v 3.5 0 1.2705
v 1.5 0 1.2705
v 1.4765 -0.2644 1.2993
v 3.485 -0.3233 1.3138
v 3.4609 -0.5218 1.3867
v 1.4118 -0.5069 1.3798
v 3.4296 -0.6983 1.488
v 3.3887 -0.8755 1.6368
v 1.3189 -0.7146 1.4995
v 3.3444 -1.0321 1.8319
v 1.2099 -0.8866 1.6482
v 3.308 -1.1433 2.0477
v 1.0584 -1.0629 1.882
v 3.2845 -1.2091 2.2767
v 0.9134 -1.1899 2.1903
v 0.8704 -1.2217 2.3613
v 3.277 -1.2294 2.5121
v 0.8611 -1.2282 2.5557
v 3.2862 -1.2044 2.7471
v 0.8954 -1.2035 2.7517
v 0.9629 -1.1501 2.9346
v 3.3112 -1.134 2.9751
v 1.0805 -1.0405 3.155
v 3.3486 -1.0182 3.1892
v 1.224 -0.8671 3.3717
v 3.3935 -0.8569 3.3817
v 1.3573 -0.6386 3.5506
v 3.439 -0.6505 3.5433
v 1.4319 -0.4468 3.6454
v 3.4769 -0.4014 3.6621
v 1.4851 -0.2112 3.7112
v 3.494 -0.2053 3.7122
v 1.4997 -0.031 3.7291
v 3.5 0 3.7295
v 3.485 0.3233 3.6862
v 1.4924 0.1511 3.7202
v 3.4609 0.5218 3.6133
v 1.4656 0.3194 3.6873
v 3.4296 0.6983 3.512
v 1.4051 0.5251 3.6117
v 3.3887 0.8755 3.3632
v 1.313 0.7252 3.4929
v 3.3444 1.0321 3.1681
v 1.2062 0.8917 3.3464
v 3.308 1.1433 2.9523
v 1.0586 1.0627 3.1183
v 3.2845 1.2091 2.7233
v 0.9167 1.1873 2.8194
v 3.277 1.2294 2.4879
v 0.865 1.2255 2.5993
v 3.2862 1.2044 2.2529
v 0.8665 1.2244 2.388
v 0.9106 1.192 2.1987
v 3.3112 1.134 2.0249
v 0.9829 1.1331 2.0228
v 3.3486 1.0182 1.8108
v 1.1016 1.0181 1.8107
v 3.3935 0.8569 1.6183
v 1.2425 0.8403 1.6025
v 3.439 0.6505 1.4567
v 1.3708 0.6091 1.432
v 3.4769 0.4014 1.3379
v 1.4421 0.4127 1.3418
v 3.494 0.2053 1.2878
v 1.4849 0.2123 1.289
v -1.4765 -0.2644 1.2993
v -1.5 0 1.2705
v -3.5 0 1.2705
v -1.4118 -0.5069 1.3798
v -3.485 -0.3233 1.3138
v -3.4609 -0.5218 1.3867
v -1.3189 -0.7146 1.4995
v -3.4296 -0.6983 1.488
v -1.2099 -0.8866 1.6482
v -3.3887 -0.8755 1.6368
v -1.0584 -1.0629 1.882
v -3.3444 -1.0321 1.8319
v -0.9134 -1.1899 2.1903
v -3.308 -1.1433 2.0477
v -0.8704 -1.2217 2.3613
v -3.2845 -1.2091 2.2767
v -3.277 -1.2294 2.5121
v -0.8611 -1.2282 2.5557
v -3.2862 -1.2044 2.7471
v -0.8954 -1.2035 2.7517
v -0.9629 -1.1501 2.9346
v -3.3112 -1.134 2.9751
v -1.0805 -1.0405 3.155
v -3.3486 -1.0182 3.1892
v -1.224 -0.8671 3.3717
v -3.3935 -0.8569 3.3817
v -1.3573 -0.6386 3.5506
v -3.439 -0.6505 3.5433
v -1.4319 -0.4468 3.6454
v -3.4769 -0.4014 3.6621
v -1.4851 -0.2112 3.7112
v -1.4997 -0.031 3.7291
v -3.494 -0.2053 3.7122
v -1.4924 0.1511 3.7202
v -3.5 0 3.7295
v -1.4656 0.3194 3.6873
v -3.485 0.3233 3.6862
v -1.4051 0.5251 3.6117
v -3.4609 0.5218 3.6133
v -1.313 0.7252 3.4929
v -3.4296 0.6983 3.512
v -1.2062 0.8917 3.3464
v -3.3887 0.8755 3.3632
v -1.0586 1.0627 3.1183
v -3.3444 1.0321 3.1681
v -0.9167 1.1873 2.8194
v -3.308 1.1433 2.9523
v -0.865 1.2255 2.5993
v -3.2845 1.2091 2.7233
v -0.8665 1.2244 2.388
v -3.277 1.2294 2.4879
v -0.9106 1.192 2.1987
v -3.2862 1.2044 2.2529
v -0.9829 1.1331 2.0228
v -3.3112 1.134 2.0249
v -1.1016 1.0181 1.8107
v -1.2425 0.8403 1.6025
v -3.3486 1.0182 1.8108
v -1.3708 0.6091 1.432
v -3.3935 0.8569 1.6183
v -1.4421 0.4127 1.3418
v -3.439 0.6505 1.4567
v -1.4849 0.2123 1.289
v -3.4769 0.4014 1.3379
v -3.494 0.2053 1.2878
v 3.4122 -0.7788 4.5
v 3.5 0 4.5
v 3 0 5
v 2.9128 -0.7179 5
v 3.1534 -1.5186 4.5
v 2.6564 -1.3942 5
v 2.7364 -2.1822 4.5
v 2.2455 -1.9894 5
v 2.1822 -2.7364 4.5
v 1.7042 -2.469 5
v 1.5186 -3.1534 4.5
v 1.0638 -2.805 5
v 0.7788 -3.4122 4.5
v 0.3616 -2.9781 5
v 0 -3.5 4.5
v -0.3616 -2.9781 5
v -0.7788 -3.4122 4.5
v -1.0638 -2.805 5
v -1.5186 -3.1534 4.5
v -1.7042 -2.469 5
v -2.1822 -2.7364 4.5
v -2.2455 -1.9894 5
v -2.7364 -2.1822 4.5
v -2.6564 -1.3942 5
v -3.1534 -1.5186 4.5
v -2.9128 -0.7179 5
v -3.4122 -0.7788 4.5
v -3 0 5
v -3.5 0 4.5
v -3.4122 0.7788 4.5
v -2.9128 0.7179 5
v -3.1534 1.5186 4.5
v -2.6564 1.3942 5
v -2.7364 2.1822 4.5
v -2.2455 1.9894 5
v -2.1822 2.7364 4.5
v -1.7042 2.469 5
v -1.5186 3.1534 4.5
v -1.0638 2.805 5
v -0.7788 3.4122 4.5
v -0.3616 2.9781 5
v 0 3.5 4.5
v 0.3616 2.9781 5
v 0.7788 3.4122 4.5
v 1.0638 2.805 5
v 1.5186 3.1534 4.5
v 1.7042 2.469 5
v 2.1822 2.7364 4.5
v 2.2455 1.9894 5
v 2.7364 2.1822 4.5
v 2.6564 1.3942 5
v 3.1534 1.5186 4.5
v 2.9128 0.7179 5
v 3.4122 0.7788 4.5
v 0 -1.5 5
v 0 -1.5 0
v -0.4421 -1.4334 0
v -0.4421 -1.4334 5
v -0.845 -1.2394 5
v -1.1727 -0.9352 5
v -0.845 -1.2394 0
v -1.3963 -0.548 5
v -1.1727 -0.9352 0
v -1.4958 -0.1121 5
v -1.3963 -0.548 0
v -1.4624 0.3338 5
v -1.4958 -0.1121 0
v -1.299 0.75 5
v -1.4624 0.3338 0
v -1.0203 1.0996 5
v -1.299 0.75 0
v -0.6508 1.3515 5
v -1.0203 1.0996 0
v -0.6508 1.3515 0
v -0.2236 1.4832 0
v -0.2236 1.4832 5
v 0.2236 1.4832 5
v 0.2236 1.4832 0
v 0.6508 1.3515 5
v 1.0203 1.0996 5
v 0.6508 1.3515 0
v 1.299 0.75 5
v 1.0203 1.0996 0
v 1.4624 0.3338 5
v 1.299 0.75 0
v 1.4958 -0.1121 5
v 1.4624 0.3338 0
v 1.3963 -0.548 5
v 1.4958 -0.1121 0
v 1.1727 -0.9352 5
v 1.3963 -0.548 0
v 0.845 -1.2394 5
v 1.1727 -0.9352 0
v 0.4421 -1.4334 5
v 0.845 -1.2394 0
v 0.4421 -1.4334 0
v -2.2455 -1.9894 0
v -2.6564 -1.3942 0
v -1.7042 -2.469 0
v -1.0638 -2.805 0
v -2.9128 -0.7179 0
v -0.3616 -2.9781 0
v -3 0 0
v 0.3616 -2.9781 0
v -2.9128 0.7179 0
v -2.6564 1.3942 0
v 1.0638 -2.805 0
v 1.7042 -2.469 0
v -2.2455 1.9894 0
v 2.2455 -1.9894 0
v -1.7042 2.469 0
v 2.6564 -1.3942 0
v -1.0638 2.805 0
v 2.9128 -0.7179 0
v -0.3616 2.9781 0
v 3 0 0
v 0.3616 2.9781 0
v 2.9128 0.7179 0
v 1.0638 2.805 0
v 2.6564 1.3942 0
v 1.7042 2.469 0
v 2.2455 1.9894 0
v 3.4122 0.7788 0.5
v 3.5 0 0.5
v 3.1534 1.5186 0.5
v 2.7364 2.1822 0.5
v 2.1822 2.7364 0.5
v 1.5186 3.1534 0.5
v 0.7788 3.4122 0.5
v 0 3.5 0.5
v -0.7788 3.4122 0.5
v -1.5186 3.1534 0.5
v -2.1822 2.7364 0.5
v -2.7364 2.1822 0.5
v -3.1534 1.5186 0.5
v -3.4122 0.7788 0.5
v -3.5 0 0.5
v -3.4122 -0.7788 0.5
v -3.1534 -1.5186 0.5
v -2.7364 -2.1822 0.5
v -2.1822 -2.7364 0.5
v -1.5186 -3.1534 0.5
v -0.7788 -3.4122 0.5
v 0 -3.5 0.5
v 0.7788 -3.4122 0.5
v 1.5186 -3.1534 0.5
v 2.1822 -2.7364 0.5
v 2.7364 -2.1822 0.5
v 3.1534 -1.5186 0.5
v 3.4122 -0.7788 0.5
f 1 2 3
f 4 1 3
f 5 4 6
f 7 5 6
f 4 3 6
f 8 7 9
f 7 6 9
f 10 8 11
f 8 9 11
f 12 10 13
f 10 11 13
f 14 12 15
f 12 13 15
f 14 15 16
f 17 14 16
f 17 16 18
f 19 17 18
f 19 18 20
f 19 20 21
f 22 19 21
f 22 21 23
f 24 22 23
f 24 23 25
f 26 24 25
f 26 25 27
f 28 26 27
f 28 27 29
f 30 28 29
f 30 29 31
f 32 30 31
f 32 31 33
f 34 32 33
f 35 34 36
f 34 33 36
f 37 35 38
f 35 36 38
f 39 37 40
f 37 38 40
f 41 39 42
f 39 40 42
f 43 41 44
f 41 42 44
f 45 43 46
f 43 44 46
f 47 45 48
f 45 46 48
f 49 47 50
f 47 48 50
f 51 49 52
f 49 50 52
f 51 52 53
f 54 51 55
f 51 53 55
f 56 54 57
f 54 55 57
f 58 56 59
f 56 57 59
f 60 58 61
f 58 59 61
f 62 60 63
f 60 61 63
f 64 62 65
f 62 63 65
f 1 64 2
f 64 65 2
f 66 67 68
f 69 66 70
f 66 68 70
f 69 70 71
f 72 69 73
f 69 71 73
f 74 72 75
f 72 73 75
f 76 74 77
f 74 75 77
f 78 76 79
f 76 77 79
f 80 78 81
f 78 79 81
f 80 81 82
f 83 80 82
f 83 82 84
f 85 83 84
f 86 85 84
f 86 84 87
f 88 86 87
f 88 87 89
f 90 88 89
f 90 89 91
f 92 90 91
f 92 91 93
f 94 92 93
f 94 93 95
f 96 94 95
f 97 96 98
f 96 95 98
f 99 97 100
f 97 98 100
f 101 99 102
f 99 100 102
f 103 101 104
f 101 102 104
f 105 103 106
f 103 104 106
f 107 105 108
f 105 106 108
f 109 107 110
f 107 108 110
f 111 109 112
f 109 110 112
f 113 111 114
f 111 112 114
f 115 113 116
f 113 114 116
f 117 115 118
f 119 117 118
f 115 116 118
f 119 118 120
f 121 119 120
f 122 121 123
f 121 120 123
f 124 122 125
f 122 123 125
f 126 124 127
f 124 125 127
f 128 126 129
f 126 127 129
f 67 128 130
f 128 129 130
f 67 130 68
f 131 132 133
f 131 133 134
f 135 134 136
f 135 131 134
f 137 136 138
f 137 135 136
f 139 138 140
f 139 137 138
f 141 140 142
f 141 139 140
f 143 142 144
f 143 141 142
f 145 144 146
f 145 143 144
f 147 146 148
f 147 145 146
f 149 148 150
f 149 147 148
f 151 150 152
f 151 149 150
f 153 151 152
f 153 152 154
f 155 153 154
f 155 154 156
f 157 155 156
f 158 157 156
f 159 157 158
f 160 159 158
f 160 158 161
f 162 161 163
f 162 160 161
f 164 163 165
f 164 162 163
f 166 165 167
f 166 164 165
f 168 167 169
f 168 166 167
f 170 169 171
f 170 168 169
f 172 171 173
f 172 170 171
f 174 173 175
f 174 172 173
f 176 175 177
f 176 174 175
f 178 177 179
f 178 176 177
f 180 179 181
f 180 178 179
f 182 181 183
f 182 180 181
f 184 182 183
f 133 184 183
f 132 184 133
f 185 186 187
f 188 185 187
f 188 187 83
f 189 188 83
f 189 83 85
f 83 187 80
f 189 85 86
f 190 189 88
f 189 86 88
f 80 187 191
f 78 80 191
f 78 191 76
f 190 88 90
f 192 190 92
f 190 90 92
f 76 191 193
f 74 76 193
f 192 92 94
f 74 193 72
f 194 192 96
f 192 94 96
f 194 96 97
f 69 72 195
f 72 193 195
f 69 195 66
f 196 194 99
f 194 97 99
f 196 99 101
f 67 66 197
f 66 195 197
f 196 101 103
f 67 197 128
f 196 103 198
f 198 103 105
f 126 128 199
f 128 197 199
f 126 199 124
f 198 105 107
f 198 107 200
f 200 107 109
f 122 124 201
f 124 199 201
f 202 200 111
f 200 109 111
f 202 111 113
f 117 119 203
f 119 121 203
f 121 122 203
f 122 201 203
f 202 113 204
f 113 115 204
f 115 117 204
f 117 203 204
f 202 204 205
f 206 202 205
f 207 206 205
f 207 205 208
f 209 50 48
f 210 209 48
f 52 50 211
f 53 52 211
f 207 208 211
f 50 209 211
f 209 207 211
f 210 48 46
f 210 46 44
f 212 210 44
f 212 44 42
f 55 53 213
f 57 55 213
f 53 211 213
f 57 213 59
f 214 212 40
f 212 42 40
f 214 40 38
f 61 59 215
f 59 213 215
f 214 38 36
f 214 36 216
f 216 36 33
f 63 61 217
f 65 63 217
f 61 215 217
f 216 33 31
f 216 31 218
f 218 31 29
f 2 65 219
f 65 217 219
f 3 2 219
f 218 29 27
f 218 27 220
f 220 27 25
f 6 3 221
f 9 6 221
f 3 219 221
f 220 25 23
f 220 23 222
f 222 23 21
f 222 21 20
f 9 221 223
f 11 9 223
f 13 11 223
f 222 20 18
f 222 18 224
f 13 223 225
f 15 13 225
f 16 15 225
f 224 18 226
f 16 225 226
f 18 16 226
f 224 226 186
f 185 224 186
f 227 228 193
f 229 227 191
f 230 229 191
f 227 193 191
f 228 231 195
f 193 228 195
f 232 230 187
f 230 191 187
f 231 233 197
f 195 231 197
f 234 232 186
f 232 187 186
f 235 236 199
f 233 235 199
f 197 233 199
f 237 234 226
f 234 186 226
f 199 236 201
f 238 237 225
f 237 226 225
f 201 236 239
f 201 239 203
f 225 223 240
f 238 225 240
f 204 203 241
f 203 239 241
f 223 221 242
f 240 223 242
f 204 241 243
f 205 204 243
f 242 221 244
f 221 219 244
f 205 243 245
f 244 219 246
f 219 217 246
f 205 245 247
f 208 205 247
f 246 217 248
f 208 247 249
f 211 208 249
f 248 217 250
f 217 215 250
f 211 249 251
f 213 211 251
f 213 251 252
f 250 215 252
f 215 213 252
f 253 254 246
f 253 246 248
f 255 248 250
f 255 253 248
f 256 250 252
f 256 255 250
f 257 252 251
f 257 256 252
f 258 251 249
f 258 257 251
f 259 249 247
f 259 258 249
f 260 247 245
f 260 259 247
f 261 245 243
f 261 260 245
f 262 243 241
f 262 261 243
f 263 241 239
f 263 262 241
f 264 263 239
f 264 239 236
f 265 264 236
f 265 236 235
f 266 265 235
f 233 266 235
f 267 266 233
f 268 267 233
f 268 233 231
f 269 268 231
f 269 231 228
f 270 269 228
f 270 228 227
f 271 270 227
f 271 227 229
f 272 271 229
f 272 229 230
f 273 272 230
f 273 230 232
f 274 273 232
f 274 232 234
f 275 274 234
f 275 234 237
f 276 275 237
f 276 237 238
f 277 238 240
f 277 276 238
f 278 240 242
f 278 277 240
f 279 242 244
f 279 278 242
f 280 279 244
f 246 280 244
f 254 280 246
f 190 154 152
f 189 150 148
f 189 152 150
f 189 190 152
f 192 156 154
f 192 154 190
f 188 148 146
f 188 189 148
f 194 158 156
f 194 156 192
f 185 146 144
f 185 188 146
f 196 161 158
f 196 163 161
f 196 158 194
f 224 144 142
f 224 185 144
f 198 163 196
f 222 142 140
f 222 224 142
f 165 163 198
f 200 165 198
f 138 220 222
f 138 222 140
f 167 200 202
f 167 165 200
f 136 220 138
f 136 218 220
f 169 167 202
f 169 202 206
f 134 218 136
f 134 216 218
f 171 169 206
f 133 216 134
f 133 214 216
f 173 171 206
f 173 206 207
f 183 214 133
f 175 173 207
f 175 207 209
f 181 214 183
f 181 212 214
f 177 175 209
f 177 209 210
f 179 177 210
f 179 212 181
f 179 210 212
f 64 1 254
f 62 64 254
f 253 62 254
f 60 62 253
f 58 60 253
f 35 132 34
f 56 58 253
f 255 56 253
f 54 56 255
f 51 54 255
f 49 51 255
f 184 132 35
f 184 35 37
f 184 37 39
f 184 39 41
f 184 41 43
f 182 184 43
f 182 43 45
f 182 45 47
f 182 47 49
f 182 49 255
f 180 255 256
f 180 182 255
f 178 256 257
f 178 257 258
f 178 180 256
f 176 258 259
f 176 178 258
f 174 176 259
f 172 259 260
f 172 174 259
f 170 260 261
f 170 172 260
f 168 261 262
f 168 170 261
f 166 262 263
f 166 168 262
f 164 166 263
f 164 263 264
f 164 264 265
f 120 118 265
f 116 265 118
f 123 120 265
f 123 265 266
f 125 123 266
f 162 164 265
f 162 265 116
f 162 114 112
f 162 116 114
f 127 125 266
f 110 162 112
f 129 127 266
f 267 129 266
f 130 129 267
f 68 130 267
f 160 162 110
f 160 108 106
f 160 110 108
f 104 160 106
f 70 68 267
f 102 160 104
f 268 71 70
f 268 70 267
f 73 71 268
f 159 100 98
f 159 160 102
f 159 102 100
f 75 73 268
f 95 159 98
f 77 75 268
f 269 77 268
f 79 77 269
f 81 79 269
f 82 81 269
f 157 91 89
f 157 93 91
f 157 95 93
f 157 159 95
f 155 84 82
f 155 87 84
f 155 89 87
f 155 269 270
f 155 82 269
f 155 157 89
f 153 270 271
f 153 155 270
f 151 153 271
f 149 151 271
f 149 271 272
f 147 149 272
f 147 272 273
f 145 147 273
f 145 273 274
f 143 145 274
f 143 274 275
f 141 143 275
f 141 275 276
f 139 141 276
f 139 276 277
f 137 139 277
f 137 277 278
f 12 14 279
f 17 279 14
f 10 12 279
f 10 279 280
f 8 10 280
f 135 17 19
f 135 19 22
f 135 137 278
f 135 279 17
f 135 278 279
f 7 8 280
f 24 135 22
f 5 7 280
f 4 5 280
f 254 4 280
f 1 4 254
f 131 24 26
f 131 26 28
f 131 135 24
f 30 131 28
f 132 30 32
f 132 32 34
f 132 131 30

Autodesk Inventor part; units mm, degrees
ref_plane "YZ Plane" through (0, 0, 0) normal (1, 0, 0) x (0, 1, 0)
ref_plane "XZ Plane" through (0, 0, 0) normal (0, 1, 0) x (-1, 0, 0)
ref_plane "XY Plane" through (0, 0, 0) normal (0, 0, 1) x (1, 0, 0)
sketch "スケッチ1" plane through (0, 0, 0) normal (0, 0, 1) x (1, 0, 0)
  line L0 (-3.5, 3.5) -> (3.5, 3.5)
  line L1 (3.5, 3.5) -> (3.5, -3.5)
  line L2 (3.5, -3.5) -> (-3.5, -3.5)
  line L3 (-3.5, -3.5) -> (-3.5, 3.5)
  line L4 (-3.5, 3.5) -> (3.5, -3.5) construction
  line L5 (3.5, 3.5) -> (-3.5, -3.5) construction
  point P0 (0, 0)
  dimension "d0" = 7
  dimension "d2" = 7
extrude "押し出し1" add sketch "スケッチ1" along normal blind 5
sketch "スケッチ2" plane through (3.5, -3.5, 0) normal (1, 0, 0) x (0, 0, -1)
  line L0 (-5, 0) -> (-5, 7) projected
  line L1 (0, 0) -> (-5, 0) projected
  point P0 (0, 3.5)
  point P1 (-2.5, 3.5)
  dimension "d5" = 2.5
  dimension "d6" = 3.5
hole "穴1" at (3.5, 0, 2.5) direction (-1, 0, 0) diameter 2.459 end through all thread size "M3x0.5" class "6H" standard "ANSI Metric M Profile"
sketch "スケッチ3" plane through (0, 0, 5) normal (0, 0, 1) x (1, 0, 0)
  line L0 (3.5, 3.5) -> (-3.5, 3.5) projected
  line L1 (-3.5, 3.5) -> (-3.5, -3.5) projected
  line L2 (-3.5, -3.5) -> (3.5, -3.5) projected
  line L3 (3.5, -3.5) -> (3.5, 3.5) projected
  circle A0 centre (0, 0) radius 3.5
  point P0 (0, 0)
extrude "押し出し2" cut sketch "スケッチ3" against normal blind 5 contours L3 A0 L0 | A0 L1 L0 | L3 L2 A0 | A0 L2 L1
sketch "スケッチ4" plane through (0, 0, 5) normal (0, 0, 1) x (1, 0, 0)
  circle A0 centre (0, 0) radius 3.5 projected
  circle A1 centre (0, 0) radius 1.5
  dimension "d16" = 3
hole "穴2" at (0, 0, 5) at (0, 0, 5) direction (0, 0, -1) diameter 3 end through all
chamfer "面取り1" distance 0.5 angle 45 2 edges at (-3.5, 0, 0) (-3.5, 0, 5)
properties part number "sttopa" material "アルミニウム 2014-T4"
